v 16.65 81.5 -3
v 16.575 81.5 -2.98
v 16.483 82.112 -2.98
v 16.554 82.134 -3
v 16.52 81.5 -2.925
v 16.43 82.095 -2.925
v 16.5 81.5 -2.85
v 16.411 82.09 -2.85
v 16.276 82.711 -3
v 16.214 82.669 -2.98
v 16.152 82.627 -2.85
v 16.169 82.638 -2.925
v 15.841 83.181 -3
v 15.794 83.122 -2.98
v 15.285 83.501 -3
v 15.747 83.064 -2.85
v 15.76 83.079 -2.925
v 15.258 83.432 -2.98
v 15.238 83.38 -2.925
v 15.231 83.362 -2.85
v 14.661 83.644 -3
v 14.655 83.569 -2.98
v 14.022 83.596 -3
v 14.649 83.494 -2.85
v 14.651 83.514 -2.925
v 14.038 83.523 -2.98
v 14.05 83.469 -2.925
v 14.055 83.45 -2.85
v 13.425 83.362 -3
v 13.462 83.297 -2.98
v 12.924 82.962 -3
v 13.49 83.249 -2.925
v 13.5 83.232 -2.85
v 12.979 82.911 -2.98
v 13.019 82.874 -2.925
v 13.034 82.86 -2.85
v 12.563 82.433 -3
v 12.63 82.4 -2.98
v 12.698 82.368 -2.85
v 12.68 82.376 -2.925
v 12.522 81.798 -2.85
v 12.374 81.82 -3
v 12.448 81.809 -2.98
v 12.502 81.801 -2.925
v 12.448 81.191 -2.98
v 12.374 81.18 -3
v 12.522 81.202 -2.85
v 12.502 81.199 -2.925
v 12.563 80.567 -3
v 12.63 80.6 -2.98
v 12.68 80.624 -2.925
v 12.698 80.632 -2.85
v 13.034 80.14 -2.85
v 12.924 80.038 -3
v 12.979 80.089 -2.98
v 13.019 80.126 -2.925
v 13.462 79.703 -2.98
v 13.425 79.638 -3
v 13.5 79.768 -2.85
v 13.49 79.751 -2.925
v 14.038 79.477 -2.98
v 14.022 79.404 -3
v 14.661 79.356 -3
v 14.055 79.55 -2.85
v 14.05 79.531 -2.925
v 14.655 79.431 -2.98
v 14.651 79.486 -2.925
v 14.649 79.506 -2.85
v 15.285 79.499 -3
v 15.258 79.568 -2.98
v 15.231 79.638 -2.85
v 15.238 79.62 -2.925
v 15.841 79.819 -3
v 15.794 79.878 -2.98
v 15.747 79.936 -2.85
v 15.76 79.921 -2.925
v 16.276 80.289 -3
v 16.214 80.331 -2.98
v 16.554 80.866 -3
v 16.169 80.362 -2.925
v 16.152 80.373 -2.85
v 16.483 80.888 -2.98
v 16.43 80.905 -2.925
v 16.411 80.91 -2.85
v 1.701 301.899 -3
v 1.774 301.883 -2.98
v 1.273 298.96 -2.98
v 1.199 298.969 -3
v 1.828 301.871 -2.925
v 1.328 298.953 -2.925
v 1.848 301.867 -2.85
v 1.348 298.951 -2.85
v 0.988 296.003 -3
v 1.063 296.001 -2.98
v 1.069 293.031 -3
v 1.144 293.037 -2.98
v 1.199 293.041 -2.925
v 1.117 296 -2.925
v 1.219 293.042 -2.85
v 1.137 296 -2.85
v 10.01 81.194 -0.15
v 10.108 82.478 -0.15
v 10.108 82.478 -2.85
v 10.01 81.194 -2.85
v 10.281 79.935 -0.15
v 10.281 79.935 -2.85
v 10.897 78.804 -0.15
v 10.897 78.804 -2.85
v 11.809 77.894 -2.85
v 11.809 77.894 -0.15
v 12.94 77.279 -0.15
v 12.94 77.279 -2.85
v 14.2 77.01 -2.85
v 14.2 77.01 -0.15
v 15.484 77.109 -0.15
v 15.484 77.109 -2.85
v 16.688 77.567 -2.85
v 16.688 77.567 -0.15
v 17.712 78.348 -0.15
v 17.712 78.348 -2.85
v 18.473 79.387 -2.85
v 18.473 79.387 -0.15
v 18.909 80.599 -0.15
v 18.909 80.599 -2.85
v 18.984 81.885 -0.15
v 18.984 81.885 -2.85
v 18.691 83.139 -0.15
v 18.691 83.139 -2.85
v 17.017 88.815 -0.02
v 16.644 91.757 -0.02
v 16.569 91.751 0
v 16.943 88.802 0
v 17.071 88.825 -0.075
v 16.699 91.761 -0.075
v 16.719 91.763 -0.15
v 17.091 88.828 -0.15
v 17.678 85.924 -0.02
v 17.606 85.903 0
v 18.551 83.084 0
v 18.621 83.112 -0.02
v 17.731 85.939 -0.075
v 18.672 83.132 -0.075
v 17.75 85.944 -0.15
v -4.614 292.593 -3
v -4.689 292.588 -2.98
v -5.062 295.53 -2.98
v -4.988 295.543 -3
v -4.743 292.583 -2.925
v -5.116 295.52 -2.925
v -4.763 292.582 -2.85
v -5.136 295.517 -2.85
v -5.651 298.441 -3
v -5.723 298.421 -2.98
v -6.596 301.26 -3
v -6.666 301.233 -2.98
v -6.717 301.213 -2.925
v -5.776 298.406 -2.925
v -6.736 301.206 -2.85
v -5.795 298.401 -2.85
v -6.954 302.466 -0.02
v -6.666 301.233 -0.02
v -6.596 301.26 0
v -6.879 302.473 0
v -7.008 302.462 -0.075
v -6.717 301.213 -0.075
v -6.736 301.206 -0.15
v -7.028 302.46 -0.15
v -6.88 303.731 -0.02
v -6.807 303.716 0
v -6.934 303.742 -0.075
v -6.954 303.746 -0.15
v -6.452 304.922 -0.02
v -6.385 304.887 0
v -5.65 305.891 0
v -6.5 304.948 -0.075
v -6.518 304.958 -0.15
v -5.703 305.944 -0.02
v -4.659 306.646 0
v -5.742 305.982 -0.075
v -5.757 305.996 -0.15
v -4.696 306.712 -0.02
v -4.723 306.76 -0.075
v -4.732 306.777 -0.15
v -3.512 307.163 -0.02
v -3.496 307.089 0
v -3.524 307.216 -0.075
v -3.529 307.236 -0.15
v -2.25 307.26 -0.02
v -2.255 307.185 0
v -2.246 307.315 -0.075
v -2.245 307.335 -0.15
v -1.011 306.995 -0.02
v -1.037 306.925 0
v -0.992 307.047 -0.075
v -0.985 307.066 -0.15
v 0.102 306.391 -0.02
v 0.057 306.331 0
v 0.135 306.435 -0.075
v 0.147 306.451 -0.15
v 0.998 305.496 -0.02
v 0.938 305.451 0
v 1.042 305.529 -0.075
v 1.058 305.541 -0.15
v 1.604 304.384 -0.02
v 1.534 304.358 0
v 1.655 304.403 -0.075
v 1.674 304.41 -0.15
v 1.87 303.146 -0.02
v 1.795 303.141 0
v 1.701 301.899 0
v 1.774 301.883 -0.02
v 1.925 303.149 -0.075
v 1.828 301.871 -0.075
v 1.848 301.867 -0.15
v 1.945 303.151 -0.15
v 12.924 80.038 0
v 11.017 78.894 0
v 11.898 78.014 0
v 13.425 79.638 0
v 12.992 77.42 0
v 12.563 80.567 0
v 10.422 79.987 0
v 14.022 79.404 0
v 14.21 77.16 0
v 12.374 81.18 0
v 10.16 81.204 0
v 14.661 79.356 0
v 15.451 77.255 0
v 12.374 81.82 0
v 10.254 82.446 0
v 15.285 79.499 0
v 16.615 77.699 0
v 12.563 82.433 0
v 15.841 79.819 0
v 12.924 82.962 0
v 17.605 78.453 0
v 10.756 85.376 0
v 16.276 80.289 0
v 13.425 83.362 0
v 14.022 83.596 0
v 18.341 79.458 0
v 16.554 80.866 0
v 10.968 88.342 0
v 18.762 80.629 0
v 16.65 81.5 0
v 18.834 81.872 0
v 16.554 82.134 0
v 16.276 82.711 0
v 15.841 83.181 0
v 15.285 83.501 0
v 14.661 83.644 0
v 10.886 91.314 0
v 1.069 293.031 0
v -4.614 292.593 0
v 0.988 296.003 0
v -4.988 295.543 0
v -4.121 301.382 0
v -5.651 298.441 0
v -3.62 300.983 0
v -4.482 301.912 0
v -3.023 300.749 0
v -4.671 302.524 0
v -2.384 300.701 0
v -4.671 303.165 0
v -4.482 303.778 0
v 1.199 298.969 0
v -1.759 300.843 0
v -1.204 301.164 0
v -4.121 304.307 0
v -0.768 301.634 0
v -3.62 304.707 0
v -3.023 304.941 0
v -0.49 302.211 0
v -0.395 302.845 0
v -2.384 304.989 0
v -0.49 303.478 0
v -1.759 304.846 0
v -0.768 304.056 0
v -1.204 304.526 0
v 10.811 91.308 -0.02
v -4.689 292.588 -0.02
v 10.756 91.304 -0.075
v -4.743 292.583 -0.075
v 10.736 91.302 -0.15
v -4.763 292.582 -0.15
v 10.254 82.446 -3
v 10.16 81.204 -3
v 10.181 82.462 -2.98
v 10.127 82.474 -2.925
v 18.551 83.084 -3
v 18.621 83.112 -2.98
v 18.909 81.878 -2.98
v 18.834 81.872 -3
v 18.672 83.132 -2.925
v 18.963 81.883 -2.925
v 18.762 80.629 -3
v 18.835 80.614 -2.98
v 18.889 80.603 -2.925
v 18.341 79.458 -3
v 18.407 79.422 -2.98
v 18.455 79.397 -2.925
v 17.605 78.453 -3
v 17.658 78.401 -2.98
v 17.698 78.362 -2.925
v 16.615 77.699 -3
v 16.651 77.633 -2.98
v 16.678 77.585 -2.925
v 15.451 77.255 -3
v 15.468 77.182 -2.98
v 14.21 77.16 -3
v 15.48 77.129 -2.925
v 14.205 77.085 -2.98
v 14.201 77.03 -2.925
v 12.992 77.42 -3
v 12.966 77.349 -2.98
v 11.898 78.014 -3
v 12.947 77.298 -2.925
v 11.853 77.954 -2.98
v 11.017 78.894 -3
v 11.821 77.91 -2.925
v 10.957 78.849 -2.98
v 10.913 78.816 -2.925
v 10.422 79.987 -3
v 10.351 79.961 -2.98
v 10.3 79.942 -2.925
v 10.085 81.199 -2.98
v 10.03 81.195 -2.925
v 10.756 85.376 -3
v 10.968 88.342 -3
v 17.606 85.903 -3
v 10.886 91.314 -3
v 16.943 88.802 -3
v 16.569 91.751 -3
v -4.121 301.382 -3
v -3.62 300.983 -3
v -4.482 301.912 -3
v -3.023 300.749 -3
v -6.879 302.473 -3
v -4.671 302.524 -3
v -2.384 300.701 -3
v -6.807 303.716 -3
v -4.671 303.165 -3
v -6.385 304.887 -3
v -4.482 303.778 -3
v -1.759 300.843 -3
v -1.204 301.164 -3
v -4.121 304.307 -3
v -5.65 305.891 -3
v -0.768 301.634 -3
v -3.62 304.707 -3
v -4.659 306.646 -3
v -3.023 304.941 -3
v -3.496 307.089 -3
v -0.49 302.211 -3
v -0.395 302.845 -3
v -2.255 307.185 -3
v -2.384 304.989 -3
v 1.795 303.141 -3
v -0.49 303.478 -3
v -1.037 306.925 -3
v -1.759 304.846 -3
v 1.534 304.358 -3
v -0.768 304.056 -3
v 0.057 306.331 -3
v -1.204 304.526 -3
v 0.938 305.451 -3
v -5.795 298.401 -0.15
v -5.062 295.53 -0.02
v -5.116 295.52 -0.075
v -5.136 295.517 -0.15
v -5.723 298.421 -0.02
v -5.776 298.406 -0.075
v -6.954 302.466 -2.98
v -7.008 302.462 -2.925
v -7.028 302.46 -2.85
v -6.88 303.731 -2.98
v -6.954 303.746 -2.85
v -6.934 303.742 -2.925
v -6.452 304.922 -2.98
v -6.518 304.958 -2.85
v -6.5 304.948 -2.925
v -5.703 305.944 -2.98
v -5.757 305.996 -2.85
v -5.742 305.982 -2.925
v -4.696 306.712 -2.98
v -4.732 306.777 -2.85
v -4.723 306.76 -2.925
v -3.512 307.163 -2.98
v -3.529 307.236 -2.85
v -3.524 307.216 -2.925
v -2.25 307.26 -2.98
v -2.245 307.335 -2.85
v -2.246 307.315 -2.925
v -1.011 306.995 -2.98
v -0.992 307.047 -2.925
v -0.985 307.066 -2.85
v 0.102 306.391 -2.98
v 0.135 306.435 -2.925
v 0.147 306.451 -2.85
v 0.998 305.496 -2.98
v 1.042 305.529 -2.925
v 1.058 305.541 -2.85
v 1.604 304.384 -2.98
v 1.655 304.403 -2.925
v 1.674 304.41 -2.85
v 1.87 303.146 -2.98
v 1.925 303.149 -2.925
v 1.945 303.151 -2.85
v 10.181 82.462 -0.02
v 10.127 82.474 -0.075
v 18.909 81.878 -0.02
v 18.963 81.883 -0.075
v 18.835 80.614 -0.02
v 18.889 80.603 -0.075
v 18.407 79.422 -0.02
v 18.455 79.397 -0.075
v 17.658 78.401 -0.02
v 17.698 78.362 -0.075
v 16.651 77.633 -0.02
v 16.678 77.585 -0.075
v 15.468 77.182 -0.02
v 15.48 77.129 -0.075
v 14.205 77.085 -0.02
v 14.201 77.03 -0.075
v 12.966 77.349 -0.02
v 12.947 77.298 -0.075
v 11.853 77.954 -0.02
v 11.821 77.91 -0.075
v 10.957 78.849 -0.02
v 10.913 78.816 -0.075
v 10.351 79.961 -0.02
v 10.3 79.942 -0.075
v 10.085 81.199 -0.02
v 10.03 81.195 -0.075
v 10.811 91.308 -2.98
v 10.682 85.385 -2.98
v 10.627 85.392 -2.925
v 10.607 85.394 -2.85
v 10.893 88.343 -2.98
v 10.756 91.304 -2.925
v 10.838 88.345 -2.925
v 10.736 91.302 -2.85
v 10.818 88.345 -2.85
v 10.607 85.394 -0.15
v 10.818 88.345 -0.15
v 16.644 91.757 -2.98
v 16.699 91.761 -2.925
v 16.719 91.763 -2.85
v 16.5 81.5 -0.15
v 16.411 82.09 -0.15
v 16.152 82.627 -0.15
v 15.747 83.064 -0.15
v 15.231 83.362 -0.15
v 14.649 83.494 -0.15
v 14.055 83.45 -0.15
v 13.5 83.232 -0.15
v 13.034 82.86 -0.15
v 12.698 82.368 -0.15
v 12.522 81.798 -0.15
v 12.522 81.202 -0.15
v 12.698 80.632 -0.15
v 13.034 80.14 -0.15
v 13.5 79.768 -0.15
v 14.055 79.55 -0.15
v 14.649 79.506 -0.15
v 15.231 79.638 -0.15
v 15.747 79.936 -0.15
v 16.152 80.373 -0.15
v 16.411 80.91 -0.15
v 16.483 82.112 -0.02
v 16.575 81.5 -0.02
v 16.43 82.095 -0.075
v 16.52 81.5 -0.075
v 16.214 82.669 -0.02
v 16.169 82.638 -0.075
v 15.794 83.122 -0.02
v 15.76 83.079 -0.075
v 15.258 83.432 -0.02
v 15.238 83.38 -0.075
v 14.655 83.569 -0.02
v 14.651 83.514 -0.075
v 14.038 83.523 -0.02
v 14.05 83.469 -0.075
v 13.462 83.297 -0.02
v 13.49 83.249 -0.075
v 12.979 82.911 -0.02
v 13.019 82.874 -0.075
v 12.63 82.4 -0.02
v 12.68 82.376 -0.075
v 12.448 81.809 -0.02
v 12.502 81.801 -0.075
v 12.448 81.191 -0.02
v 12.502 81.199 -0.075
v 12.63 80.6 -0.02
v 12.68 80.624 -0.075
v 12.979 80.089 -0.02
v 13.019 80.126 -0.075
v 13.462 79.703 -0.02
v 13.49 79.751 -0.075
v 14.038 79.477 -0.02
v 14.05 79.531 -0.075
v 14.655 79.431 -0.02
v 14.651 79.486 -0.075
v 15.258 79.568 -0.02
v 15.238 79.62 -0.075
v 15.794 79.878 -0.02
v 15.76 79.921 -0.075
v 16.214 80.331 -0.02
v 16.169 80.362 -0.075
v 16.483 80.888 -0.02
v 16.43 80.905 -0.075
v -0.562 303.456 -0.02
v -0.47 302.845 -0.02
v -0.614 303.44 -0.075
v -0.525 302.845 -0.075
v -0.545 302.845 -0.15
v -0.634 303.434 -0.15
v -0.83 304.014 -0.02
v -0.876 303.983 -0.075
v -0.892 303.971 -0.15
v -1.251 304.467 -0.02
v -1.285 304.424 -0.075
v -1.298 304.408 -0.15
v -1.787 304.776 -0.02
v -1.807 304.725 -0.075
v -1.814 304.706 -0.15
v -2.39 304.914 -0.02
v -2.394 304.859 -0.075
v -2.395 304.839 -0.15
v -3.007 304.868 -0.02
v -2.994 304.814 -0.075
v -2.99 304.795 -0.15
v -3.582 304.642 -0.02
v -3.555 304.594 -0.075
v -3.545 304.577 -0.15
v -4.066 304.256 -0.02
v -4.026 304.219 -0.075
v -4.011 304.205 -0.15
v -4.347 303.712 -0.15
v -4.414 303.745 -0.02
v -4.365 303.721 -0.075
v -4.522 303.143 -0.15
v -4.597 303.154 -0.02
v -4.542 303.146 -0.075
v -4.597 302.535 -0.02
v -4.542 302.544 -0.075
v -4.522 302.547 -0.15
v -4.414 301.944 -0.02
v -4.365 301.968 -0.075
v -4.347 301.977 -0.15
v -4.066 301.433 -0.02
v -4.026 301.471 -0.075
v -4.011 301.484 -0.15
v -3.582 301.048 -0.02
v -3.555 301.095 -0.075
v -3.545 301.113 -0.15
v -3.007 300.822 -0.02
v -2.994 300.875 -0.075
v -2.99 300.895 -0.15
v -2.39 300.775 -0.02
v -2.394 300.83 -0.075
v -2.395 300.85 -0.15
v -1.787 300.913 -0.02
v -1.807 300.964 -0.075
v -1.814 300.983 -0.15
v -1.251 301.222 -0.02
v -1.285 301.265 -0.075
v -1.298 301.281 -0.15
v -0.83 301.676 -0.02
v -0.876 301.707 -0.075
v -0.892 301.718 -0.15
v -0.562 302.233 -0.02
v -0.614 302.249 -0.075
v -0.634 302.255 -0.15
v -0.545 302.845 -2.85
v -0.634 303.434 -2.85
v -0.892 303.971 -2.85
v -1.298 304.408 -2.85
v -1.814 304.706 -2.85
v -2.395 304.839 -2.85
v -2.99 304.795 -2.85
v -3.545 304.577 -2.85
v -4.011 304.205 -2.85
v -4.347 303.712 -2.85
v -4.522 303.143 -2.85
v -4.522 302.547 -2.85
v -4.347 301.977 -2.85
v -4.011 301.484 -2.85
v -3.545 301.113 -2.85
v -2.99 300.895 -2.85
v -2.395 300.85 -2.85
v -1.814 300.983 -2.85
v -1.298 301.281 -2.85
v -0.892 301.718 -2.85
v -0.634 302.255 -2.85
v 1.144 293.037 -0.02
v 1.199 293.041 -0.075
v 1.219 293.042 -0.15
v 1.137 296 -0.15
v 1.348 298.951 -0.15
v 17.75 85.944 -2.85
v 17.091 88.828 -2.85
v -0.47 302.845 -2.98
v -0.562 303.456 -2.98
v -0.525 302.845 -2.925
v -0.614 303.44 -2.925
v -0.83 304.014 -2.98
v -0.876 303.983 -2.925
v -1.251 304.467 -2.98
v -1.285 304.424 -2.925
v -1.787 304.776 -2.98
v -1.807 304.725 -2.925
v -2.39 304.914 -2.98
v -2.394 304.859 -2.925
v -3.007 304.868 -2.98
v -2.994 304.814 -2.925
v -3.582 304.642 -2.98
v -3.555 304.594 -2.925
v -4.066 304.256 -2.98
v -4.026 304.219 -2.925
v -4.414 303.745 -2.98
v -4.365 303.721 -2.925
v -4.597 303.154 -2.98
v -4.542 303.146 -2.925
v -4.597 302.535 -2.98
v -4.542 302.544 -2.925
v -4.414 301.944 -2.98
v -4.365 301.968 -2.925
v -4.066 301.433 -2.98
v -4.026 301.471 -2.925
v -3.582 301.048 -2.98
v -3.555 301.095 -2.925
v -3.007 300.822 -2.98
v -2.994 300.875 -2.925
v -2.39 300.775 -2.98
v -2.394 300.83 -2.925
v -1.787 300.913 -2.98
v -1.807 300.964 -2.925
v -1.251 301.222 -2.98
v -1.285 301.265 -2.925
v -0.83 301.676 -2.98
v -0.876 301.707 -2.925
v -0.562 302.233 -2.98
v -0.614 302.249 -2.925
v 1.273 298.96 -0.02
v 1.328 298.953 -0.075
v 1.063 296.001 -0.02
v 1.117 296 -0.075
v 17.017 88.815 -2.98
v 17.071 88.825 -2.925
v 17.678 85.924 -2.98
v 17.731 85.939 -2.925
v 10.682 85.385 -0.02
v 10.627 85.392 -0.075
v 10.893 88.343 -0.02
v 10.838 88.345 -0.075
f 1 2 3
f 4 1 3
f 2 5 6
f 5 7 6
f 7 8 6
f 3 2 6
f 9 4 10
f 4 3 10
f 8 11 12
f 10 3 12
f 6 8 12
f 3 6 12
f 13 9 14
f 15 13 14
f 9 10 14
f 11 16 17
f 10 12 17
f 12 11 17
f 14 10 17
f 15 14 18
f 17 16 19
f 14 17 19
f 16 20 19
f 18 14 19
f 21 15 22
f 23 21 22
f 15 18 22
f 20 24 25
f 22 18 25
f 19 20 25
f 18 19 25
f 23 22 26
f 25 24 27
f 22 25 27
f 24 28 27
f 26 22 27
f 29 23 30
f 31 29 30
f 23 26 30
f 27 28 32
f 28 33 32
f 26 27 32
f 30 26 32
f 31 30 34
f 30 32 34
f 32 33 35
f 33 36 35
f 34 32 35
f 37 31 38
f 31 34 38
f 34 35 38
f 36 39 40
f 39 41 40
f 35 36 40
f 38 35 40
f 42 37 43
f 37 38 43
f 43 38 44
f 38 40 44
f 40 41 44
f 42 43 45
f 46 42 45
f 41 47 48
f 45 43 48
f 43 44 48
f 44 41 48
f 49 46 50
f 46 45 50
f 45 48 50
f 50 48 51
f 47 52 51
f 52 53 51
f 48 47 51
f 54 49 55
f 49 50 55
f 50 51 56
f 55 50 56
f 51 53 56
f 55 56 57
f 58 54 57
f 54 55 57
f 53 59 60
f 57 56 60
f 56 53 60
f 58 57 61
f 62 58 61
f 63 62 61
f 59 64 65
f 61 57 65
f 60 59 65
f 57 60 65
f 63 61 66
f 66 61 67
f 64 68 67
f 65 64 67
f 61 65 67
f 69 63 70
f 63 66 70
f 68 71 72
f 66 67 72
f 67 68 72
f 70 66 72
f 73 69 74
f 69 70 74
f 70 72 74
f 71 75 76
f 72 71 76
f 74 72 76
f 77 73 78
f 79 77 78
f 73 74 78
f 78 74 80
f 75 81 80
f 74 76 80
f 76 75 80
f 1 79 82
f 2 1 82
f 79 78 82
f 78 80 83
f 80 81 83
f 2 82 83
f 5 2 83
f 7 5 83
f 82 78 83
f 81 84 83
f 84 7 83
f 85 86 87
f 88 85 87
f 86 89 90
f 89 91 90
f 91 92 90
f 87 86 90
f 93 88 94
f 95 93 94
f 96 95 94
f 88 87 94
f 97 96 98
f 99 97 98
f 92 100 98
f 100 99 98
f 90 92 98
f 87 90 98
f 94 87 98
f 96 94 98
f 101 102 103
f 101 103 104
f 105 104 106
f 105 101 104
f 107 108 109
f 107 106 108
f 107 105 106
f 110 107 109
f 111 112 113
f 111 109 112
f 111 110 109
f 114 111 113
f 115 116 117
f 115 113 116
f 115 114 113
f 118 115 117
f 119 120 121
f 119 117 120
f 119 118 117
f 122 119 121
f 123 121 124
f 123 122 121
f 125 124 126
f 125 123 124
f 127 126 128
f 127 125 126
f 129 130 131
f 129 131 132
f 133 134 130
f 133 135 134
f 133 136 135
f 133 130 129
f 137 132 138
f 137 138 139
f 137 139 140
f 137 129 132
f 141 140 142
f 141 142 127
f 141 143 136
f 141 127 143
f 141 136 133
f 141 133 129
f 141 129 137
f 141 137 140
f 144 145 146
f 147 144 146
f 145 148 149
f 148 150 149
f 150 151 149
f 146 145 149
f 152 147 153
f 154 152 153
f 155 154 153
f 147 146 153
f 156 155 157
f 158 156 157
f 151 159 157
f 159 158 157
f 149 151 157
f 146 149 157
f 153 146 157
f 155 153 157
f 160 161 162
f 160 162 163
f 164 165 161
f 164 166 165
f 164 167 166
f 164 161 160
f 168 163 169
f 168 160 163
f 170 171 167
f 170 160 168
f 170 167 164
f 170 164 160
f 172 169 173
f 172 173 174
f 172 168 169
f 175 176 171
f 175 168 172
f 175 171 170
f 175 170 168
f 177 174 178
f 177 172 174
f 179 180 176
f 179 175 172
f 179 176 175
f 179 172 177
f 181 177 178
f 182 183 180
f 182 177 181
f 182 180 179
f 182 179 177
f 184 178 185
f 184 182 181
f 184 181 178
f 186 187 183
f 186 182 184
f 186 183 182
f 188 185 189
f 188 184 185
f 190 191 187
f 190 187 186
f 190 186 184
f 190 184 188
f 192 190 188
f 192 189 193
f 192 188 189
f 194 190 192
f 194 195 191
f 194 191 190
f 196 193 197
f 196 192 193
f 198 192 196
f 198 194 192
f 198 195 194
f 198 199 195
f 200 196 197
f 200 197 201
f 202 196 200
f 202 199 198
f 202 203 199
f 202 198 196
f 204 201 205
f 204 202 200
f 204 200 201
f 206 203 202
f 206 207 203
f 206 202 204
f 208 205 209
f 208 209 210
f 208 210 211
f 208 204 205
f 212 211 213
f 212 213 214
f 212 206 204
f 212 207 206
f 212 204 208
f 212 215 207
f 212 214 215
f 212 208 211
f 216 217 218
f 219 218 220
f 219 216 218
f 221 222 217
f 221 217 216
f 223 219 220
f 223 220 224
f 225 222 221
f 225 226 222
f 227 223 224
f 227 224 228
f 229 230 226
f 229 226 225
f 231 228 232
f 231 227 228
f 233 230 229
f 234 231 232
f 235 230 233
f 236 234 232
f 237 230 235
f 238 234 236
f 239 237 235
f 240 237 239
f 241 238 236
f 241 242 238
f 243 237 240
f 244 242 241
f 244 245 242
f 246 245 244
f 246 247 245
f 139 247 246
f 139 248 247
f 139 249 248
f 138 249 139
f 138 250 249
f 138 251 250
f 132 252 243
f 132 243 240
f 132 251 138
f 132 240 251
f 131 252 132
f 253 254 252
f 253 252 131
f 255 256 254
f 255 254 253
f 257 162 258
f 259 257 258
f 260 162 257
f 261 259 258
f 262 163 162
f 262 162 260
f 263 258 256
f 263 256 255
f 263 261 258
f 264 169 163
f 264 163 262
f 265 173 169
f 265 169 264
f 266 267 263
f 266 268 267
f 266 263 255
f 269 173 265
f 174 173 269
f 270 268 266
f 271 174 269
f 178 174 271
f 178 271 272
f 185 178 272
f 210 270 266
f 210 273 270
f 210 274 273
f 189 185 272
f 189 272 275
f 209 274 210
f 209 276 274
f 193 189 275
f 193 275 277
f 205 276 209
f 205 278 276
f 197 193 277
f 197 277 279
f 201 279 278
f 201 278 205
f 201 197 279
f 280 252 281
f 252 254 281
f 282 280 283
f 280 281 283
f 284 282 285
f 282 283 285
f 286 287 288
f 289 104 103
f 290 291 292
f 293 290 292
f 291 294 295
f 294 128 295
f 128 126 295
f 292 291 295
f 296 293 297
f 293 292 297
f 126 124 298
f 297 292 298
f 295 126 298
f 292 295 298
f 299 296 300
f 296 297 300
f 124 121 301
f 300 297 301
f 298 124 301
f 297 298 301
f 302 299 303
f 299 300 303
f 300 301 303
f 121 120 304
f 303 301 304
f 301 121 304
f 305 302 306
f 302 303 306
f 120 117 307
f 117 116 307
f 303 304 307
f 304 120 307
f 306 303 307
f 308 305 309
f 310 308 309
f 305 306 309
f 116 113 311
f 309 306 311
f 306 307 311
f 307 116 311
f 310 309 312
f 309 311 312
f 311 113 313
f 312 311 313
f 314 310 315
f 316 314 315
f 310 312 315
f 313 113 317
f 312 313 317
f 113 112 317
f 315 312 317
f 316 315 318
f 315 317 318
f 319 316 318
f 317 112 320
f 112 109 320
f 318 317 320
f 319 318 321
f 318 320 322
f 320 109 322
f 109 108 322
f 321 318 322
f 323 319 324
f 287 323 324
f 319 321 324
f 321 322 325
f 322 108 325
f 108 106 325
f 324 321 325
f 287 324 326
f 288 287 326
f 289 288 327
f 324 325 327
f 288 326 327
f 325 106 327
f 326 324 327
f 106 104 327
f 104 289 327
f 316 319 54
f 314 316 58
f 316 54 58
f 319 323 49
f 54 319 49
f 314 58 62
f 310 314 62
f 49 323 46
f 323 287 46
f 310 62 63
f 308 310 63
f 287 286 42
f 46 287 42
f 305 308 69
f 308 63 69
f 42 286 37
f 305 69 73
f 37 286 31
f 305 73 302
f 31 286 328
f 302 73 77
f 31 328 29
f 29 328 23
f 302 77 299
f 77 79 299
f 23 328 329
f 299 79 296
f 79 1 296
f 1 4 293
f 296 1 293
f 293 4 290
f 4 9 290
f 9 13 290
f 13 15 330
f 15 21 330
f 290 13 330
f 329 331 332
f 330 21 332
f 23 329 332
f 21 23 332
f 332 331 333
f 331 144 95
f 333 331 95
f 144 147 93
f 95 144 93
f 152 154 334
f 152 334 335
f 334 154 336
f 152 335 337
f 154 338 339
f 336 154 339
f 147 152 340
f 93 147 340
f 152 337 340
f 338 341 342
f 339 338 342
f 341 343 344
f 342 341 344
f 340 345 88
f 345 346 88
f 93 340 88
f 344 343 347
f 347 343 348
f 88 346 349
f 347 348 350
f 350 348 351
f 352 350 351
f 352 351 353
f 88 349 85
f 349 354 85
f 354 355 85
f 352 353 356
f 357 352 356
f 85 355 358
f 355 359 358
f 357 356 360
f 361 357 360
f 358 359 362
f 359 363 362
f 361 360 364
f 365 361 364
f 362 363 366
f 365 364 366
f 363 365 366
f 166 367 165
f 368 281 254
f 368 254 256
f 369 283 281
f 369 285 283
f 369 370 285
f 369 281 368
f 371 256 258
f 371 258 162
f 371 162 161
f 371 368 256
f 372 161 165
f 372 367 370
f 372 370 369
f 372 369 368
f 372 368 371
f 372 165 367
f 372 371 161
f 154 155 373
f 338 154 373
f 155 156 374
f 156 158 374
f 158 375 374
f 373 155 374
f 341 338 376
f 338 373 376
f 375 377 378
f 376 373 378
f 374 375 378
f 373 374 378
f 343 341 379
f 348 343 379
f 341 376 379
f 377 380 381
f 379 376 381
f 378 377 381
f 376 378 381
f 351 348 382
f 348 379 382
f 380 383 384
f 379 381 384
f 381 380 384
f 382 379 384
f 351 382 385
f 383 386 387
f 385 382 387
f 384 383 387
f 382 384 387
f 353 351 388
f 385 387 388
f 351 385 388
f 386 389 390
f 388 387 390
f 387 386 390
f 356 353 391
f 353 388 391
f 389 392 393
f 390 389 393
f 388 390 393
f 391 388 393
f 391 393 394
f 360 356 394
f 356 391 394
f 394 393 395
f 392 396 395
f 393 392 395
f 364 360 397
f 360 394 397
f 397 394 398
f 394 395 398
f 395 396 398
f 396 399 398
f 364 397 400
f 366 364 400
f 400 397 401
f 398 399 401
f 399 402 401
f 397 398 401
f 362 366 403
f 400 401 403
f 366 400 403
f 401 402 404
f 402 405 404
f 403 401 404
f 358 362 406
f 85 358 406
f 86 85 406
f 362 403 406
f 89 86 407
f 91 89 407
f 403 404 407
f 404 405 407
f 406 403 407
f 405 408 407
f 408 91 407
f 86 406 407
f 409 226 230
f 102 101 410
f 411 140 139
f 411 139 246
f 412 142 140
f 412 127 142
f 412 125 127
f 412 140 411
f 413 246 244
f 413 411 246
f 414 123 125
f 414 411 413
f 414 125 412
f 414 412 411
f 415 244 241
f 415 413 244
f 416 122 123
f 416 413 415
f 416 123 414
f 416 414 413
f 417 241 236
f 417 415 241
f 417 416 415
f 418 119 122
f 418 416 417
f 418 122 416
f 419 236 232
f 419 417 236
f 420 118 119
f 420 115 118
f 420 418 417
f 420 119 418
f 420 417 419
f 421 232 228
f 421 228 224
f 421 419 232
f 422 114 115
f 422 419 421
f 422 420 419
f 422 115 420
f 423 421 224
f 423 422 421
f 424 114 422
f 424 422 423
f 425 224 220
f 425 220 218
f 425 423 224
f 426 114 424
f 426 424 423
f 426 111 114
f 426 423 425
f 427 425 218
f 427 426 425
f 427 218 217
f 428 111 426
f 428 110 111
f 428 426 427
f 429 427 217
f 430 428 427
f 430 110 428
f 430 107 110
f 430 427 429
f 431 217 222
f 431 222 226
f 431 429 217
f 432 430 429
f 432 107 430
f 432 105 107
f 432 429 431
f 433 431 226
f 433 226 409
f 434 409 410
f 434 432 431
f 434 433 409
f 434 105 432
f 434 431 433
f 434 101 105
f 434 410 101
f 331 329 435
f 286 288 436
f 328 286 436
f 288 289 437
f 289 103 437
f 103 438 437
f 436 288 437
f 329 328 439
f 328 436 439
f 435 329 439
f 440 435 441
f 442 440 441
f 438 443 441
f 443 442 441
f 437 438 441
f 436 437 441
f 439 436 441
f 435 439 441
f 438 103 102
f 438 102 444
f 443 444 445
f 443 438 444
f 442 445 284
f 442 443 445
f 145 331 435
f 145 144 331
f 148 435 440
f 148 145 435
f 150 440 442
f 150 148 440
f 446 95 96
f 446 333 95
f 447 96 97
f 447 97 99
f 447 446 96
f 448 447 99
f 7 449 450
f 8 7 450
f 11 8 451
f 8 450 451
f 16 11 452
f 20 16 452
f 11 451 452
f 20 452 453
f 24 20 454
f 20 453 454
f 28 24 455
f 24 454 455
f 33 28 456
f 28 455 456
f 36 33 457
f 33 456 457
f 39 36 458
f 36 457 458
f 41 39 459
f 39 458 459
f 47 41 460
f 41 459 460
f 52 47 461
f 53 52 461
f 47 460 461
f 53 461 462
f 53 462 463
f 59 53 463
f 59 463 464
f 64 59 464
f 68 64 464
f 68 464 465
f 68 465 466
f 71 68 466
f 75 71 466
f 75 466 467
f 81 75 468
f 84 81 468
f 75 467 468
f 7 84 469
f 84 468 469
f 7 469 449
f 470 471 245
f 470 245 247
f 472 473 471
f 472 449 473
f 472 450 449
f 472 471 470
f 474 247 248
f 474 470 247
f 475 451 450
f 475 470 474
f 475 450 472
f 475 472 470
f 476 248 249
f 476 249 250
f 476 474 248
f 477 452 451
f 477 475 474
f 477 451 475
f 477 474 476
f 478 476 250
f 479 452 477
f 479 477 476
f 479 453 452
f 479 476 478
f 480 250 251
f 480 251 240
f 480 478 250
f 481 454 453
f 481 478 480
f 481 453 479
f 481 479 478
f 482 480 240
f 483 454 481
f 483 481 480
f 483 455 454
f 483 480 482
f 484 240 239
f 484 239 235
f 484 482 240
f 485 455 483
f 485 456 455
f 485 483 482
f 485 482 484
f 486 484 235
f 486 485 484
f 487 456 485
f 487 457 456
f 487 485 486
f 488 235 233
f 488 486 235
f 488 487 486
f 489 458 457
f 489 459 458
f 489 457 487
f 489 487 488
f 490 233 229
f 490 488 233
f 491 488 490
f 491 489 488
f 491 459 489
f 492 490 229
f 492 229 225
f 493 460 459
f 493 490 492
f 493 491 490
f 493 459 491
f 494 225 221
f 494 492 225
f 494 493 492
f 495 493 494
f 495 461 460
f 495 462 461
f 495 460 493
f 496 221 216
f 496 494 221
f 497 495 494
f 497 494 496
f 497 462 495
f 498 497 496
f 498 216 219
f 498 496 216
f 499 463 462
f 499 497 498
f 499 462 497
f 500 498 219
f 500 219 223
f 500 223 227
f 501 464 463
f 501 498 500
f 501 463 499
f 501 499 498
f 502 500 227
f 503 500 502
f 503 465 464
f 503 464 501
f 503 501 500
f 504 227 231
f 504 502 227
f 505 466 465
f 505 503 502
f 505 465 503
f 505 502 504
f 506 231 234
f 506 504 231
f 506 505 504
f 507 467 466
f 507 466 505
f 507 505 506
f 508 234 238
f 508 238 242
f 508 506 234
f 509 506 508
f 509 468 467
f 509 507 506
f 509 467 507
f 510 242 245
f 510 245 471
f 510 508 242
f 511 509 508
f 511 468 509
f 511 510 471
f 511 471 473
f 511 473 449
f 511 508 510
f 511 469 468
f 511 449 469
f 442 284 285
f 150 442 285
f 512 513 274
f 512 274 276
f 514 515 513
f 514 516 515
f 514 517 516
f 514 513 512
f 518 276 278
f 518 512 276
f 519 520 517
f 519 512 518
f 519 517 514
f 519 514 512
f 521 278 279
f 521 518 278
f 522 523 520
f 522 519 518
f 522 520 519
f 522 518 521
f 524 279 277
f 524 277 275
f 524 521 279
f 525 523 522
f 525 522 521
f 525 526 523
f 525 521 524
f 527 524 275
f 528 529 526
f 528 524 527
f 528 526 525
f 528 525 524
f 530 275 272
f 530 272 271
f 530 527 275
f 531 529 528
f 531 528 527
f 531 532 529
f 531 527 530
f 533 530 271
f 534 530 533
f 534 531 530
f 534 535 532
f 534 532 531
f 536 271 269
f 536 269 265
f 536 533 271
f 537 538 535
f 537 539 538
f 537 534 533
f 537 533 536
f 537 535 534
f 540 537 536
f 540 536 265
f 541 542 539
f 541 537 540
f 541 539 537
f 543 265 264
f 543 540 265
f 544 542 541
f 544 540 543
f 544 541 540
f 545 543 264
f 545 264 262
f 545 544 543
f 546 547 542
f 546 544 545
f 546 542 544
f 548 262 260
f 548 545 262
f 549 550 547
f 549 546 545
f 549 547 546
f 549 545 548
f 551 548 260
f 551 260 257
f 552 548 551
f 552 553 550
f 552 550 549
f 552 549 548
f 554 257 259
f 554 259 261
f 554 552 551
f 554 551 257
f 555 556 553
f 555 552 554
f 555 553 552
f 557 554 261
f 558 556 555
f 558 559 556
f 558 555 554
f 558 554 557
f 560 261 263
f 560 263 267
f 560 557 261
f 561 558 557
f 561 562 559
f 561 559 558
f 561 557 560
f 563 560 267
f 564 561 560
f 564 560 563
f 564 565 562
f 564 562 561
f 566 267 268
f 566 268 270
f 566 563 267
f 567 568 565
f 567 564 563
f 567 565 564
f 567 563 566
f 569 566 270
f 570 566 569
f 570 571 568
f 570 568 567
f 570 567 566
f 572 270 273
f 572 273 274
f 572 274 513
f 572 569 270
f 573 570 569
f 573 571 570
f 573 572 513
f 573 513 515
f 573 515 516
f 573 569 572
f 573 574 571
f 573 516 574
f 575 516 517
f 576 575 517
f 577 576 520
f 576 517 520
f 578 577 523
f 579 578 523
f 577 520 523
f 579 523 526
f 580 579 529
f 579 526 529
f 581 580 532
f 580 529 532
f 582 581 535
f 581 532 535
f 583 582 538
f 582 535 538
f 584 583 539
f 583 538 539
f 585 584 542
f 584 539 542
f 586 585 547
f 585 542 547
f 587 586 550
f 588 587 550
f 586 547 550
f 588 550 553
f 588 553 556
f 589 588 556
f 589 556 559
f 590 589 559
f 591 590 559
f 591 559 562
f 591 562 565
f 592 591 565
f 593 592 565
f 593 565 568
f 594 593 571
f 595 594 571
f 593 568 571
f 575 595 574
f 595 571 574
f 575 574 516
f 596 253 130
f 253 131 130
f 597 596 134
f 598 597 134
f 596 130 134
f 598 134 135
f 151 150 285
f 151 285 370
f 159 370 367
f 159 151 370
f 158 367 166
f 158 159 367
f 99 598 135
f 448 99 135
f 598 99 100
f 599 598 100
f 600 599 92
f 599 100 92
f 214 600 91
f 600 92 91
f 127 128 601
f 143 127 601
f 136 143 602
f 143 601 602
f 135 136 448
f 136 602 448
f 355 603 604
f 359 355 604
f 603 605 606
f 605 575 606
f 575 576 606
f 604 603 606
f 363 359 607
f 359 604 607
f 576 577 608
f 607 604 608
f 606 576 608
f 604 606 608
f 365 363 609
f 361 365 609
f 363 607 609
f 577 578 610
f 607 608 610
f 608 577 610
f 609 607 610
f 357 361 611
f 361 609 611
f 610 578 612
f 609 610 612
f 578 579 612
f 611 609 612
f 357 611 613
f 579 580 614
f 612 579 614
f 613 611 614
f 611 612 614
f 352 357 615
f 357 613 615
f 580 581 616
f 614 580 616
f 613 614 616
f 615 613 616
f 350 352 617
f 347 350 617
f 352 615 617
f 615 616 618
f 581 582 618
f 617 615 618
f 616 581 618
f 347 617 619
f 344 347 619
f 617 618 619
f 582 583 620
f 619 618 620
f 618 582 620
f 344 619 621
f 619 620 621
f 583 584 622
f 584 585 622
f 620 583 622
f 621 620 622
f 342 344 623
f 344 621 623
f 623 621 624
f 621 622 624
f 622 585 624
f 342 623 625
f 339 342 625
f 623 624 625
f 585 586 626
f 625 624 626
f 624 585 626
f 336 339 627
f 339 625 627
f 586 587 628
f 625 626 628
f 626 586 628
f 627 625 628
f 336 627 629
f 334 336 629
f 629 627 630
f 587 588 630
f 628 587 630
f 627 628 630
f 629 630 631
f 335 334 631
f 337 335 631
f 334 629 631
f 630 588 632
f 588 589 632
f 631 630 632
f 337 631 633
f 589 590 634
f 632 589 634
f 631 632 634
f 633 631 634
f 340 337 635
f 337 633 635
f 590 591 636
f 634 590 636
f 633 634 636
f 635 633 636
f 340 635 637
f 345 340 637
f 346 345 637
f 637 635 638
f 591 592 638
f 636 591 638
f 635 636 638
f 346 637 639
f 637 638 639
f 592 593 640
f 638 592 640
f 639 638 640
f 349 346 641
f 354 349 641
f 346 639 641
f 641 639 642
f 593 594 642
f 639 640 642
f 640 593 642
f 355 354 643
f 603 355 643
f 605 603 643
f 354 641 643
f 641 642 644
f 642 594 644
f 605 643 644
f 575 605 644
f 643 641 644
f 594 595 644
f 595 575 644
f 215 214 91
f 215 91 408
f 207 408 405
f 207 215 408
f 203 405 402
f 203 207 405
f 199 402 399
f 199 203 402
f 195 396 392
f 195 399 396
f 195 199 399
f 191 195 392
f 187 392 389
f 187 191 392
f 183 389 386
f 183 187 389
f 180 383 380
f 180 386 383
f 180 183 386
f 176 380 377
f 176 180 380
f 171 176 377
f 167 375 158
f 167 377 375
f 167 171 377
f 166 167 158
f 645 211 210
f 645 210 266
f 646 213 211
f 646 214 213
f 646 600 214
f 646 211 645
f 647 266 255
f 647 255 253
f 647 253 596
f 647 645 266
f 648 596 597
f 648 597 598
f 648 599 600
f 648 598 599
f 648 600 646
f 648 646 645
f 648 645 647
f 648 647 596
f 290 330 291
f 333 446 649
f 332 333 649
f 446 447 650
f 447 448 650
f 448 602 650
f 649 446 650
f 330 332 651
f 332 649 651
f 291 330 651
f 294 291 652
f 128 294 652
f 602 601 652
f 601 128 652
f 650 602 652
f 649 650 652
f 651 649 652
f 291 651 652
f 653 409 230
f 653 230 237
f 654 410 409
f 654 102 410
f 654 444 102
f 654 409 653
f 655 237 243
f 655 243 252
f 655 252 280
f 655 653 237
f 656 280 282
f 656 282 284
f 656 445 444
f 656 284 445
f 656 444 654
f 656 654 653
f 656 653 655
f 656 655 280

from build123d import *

# Parameters (mm, degrees)
SKETCH1_R           = 2
BOSS_EXTRUDE1_DEPTH = 3
FILLET1_R           = 30
FILLET2_R           = 0.15


with BuildPart() as part:
    # Sketch1 → Boss-Extrude1 (new body)
    with BuildSketch(Plane.XY):
        with BuildLine():
            ThreePointArc((11.251333126, 84.613866333), (14.845502434, 77.013283153), (17.233622255, 85.074536245))
            Line((17.233622255, 85.074536245), (17.491144565, 81.730334956))
            ThreePointArc((17.491144565, 81.730334956), (14.730334956, 78.508855435), (11.508855435, 81.269665044))
            Line((11.508855435, 81.269665044), (11.251333126, 84.613866333))
        make_face()
        with BuildLine():
            Line((0.446357827, 303.075032758), (17.491144565, 81.730334956))
            ThreePointArc((17.491144565, 81.730334956), (14.269665044, 84.491144565), (11.508855435, 81.269665044))
            Line((11.508855435, 81.269665044), (-5.535931303, 302.614362846))
            ThreePointArc((-5.535931303, 302.614362846), (-2.314451782, 299.853553237), (0.446357827, 303.075032758))
        make_face()
        with BuildLine():
            ThreePointArc((-5.535931303, 302.614362846), (-2.775121694, 305.835842367), (0.446357827, 303.075032758))
            Line((0.446357827, 303.075032758), (0.703880137, 299.730831469))
            ThreePointArc((0.703880137, 299.730831469), (-2.890289172, 307.331414649), (-5.278408993, 299.270161557))
            Line((-5.278408993, 299.270161557), (-5.535931303, 302.614362846))
        make_face()
        with BuildLine():
            ThreePointArc((0.446357827, 303.075032758), (-2.314451782, 299.853553237), (-5.535931303, 302.614362846))
            ThreePointArc((-5.535931303, 302.614362846), (-2.775121694, 305.835842367), (0.446357827, 303.075032758))
        make_face()
        with Locations((-2.544786738, 302.844697802)):
            Circle(SKETCH1_R, mode=Mode.SUBTRACT)
        with BuildLine():
            ThreePointArc((11.508855435, 81.269665044), (14.730334956, 78.508855435), (17.491144565, 81.730334956))
            ThreePointArc((17.491144565, 81.730334956), (14.269665044, 84.491144565), (11.508855435, 81.269665044))
        make_face()
        with Locations((14.5, 81.5)):
            Circle(SKETCH1_R, mode=Mode.SUBTRACT)
    extrude(amount=-BOSS_EXTRUDE1_DEPTH)

    # Fillet1
    fillet1_edges = [part.edges().sort_by_distance(p)[0] for p in [
        (17.233622255, 85.074536245, -1.5),
        (11.251333126, 84.613866333, -1.5),
        (-5.278408993, 299.270161557, -1.5),
        (0.703880137, 299.730831469, -1.5),
    ]]
    fillet(fillet1_edges, radius=FILLET1_R)

    # Fillet2
    fillet2_edges = [part.edges().sort_by_distance(p)[0] for p in [
        (2.986462066, 191.942013945, 0),
        (2.986462066, 191.942013945, -3),
        (14.845502434, 77.013283153, 0),
        (14.845502434, 77.013283153, -3),
        (8.968751196, 192.402683857, 0),
        (12.5, 81.5, -3),
        (8.968751196, 192.402683857, -3),
        (-2.890289172, 307.331414649, 0),
        (-2.890289172, 307.331414649, -3),
        (10.74898801, 86.866892878, 0),
        (10.74898801, 86.866892878, -3),
        (-4.544786738, 302.844697802, -3),
        (17.385098862, 87.37791074, 0),
        (17.385098862, 87.37791074, -3),
        (-5.4298856, 296.966787062, 0),
        (-5.4298856, 296.966787062, -3),
        (1.206225252, 297.477804924, 0),
        (1.206225252, 297.477804924, -3),
        (-4.544786738, 302.844697802, 0),
        (12.5, 81.5, 0),
    ]]
    fillet(fillet2_edges, radius=FILLET2_R)


solid = part.part
